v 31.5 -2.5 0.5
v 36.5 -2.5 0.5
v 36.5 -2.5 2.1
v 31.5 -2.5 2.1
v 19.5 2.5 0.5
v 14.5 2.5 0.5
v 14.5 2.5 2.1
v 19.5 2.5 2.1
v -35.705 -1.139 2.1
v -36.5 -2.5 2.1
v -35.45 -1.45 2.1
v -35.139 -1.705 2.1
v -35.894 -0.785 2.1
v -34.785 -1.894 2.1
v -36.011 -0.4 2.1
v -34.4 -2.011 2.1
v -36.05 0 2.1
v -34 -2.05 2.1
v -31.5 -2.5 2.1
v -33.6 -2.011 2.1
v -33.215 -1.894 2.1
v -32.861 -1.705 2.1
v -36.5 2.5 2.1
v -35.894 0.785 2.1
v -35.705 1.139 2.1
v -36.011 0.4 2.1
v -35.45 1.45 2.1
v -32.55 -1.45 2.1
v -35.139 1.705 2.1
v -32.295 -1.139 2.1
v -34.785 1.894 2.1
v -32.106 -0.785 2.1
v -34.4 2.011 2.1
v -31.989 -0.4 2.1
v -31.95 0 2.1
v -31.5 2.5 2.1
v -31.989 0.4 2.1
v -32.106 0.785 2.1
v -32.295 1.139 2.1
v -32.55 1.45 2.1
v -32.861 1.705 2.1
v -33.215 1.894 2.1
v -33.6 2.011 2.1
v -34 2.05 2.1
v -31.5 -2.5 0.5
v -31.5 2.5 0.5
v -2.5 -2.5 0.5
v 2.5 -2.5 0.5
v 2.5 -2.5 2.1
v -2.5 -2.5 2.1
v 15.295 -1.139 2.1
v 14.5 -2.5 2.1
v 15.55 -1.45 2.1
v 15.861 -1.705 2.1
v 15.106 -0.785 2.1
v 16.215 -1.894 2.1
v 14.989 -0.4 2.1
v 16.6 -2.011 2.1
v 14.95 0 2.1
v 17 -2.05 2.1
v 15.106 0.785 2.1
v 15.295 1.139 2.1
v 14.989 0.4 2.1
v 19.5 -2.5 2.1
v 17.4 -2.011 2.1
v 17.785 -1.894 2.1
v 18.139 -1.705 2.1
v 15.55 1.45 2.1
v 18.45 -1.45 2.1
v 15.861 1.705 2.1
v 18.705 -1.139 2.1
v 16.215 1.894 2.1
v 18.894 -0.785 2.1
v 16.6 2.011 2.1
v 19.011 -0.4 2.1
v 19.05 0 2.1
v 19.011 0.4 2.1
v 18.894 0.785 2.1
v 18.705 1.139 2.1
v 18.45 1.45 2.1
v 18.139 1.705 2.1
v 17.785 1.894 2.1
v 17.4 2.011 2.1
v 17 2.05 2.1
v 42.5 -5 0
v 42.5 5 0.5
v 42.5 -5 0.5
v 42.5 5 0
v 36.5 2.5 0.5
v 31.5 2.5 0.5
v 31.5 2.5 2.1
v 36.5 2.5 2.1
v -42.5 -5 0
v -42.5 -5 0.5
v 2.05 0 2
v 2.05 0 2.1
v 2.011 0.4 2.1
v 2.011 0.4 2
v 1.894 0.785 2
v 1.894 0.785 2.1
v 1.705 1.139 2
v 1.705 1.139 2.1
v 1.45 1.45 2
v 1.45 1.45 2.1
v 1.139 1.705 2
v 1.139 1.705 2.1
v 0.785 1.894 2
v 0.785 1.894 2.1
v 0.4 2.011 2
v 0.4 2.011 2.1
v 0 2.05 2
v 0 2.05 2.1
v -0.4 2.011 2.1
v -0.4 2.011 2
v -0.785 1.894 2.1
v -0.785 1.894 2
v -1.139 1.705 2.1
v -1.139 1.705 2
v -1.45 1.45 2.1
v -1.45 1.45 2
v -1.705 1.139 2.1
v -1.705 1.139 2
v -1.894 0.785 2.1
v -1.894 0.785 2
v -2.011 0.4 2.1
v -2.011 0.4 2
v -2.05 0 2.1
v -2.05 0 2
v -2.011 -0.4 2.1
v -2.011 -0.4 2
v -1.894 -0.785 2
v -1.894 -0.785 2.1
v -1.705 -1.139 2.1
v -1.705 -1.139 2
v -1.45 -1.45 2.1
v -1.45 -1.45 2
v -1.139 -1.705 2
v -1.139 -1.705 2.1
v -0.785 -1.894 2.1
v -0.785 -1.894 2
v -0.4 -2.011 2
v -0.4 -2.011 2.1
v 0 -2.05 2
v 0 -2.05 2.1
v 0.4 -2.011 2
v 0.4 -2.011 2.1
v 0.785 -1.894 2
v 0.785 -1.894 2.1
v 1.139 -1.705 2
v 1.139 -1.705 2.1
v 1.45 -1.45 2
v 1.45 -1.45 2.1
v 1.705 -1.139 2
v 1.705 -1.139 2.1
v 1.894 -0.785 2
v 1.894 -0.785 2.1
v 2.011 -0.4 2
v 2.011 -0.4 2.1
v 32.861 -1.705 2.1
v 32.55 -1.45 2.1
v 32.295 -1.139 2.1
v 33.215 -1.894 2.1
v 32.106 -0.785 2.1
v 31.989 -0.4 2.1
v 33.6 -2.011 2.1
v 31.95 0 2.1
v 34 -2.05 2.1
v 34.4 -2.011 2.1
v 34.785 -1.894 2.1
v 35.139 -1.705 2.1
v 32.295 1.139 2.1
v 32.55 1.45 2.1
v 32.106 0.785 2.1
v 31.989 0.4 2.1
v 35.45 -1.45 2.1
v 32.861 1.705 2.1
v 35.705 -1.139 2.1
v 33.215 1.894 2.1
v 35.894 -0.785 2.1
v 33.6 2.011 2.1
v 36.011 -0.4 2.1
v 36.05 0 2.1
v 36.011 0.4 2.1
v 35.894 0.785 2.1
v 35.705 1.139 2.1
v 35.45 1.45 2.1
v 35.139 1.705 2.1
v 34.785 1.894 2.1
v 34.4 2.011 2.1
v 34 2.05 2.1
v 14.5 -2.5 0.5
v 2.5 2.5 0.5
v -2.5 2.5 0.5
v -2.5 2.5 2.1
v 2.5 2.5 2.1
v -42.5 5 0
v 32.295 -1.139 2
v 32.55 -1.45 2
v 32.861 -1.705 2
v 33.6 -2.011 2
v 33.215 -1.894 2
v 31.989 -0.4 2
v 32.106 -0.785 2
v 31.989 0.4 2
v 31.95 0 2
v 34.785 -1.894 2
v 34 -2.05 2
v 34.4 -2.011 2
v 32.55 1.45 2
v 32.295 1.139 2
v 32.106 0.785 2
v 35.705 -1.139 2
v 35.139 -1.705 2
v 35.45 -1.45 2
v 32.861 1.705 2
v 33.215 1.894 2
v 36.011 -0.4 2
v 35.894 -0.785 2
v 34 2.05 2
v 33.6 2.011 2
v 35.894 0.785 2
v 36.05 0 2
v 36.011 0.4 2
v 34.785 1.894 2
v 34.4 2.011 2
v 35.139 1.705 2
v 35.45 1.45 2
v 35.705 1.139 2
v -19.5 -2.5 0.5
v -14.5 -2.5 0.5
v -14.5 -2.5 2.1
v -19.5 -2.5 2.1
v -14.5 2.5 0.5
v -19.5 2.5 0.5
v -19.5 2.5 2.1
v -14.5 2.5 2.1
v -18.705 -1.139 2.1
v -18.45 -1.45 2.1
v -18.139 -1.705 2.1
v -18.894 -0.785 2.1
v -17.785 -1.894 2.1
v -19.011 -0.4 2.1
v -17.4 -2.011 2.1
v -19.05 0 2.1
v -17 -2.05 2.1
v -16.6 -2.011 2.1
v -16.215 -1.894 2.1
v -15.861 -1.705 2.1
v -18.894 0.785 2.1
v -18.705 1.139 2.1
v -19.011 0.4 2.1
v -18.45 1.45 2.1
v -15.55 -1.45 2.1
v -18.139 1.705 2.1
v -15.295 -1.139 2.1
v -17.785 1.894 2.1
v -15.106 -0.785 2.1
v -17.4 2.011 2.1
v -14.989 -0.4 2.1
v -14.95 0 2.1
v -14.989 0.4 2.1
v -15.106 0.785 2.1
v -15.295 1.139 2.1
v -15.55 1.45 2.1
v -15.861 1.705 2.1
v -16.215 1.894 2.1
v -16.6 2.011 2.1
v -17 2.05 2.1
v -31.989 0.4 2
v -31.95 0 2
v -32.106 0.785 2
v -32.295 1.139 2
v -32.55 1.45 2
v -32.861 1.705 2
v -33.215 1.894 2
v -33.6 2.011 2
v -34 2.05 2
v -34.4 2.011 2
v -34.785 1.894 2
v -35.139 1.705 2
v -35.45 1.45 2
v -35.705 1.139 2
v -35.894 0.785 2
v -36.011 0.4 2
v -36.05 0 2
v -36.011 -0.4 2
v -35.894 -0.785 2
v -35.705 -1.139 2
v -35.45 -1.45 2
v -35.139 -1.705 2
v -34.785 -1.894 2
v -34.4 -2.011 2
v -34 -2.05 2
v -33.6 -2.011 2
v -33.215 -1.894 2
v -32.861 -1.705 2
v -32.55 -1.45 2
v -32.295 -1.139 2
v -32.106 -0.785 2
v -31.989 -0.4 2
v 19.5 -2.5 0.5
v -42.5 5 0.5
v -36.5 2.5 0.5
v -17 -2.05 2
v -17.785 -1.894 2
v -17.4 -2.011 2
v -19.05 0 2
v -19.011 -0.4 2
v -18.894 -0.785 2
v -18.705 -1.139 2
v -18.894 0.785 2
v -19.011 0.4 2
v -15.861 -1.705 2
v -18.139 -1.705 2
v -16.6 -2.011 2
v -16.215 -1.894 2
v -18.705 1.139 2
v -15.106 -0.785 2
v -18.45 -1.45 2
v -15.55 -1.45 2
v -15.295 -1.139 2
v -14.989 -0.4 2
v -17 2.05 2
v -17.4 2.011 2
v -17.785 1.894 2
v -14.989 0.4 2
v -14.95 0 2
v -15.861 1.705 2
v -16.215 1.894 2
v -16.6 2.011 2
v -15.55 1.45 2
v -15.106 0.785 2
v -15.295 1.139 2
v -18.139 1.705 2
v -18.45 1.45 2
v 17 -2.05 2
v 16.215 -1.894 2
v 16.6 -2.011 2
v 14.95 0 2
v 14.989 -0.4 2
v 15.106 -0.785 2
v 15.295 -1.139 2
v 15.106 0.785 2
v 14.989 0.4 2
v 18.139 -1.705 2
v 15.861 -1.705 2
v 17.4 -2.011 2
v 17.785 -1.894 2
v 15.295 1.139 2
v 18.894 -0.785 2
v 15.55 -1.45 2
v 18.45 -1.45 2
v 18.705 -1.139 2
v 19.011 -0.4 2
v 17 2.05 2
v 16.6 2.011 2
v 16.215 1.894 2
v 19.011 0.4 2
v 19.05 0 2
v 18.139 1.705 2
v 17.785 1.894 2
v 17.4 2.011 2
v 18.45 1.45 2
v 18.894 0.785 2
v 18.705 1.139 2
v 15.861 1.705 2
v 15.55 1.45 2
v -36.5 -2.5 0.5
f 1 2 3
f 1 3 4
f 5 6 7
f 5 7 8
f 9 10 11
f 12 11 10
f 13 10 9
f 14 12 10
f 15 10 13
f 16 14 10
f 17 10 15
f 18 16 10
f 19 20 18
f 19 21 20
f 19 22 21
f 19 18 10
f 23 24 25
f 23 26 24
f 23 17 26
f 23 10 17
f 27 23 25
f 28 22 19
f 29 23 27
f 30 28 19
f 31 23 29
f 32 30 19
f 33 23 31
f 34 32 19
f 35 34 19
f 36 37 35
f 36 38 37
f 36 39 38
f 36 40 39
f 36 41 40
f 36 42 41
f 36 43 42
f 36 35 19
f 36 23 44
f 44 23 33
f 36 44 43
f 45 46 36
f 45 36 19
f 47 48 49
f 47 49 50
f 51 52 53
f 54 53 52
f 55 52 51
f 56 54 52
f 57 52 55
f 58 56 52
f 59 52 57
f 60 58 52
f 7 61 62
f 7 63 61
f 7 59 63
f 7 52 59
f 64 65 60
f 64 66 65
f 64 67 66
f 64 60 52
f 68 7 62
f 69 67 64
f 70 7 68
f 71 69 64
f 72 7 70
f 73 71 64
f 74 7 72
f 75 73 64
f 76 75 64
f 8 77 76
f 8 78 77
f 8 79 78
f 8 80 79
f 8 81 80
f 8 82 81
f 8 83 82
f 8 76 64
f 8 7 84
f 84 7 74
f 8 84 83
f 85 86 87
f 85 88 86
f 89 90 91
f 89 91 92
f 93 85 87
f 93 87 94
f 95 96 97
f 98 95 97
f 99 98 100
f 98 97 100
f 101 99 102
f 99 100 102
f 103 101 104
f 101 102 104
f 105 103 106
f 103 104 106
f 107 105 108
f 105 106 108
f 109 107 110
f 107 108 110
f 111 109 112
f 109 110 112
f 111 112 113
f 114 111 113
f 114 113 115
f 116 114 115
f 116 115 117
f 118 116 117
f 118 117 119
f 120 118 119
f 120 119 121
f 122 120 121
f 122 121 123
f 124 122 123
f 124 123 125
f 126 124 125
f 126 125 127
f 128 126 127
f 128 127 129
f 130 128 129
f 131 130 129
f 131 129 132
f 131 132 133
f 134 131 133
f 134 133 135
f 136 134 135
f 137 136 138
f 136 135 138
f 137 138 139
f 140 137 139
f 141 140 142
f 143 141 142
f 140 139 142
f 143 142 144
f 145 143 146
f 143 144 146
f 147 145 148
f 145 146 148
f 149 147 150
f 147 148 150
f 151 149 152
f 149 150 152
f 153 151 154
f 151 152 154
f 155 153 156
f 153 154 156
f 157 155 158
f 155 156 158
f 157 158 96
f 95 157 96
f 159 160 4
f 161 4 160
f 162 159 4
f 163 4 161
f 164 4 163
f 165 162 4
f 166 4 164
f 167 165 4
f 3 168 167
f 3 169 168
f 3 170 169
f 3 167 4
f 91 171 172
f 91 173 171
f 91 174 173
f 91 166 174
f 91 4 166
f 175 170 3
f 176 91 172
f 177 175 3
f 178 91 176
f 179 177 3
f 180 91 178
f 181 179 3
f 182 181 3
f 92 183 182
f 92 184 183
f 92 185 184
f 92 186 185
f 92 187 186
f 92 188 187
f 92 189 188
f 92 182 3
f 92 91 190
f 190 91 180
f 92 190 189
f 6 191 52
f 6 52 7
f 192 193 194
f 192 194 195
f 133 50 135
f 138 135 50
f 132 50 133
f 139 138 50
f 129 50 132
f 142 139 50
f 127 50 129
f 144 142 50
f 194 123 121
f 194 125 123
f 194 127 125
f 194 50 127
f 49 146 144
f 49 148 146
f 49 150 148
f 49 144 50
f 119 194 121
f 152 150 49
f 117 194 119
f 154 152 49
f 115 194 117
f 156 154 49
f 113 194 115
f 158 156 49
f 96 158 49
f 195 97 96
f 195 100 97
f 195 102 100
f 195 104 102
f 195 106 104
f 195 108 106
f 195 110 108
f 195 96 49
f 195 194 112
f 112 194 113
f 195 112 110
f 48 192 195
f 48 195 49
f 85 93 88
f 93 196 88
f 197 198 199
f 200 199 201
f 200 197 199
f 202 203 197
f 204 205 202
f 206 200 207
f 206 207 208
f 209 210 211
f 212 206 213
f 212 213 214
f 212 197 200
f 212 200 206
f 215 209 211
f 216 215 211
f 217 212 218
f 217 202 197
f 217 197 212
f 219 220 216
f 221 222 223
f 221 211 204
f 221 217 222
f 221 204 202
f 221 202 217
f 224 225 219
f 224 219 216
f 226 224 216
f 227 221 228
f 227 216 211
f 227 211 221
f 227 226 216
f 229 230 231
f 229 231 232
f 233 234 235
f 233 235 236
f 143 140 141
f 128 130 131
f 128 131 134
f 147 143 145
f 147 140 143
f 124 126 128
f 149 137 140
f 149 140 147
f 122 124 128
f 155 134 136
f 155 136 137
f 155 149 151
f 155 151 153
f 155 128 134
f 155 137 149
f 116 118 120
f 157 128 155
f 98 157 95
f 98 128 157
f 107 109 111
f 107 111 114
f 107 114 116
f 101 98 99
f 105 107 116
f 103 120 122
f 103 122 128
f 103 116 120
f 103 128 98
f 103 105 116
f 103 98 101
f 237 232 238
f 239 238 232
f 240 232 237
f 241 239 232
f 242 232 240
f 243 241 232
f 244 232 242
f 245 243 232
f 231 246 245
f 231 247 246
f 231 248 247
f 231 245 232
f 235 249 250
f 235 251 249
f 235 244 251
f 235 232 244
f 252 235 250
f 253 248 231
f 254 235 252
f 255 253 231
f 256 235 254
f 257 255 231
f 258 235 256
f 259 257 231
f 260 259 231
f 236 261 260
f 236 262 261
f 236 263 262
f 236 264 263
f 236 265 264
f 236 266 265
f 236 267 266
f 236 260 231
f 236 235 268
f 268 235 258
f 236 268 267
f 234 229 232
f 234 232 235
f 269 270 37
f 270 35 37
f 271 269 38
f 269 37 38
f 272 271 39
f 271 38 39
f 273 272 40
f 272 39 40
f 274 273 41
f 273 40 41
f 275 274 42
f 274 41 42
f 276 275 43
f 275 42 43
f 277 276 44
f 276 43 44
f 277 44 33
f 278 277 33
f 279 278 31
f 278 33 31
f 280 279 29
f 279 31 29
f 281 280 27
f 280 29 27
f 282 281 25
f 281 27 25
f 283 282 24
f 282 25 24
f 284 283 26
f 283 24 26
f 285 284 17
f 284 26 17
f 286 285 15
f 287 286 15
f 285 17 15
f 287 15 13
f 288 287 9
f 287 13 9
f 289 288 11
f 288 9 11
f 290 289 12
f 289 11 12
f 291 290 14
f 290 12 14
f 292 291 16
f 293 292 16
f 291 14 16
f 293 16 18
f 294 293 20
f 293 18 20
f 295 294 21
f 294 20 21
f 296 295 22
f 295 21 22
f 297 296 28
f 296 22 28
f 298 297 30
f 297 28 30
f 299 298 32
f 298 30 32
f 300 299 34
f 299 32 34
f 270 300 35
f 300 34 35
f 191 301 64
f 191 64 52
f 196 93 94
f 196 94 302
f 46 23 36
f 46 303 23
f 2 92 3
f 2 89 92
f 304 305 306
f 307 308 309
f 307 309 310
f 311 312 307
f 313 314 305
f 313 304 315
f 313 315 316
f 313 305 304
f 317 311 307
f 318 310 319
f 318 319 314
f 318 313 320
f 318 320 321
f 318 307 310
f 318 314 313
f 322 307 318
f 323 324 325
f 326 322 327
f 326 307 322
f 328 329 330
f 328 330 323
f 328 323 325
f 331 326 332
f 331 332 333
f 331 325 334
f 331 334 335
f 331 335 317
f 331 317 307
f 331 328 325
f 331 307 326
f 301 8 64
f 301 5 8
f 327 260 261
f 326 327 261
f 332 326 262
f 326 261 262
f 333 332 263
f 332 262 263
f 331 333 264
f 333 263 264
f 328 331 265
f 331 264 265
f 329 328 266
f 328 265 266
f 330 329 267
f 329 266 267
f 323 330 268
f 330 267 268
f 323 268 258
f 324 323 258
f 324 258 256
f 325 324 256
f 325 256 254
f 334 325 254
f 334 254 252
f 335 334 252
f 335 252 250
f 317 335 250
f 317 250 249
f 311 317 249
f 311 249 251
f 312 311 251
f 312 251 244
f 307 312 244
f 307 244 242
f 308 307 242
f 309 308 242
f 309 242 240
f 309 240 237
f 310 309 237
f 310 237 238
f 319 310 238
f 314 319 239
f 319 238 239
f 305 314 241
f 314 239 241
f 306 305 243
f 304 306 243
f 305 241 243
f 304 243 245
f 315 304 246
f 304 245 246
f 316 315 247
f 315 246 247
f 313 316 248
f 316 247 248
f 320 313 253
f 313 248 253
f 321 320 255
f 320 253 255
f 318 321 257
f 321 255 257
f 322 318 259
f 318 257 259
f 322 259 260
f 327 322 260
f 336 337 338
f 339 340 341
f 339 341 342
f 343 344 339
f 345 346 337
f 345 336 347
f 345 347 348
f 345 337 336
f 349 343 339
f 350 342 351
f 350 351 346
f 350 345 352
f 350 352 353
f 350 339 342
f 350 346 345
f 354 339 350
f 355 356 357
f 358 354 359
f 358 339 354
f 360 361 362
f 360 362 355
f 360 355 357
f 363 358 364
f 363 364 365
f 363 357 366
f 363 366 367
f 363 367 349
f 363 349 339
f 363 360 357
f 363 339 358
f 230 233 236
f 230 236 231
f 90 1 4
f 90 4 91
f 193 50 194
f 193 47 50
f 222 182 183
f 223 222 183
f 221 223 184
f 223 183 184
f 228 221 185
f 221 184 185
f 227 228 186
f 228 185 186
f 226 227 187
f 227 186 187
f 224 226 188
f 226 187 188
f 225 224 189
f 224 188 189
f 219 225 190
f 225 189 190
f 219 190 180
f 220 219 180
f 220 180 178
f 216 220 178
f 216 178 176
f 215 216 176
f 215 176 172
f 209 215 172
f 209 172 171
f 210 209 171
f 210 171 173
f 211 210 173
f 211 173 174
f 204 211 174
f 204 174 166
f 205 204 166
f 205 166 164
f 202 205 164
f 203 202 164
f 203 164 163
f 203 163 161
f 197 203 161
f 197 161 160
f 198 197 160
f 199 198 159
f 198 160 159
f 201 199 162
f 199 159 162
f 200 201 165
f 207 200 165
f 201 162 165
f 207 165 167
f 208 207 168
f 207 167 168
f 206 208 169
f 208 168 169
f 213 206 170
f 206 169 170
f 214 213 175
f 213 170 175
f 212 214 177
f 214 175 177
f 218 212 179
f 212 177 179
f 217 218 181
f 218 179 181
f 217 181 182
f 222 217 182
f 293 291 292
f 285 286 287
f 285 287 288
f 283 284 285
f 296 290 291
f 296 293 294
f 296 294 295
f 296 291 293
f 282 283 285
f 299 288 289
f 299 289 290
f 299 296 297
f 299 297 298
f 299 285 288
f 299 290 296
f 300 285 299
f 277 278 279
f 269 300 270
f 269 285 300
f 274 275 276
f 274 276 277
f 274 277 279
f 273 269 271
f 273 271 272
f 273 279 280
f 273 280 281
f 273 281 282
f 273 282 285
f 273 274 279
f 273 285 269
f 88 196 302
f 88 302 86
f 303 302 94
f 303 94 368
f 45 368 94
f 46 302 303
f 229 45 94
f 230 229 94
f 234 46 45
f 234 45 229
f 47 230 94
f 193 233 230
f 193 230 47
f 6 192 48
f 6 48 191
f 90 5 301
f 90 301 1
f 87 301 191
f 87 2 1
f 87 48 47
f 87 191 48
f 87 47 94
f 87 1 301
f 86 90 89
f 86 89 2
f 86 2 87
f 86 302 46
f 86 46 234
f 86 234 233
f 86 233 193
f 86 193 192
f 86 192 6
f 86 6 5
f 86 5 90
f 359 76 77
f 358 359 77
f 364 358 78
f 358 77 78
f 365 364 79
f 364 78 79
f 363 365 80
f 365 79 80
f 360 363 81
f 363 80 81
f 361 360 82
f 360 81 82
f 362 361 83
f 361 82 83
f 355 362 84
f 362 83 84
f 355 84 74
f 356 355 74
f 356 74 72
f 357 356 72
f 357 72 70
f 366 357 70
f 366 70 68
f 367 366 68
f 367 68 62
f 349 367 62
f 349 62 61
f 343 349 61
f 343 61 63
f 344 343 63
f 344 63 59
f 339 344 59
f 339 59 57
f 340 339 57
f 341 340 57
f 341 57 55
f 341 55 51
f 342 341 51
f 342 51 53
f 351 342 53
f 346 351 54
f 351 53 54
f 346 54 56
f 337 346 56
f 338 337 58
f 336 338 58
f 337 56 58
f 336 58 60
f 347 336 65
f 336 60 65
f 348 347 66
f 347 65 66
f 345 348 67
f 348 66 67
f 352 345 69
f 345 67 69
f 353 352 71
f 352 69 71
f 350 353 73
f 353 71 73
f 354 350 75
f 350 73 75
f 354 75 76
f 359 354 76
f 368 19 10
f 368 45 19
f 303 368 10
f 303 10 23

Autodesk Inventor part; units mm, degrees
ref_plane "YZ Plane" through (0, 0, 0) normal (1, 0, 0) x (0, 1, 0)
ref_plane "XZ Plane" through (0, 0, 0) normal (0, 1, 0) x (-1, 0, 0)
ref_plane "XY Plane" through (0, 0, 0) normal (0, 0, 1) x (1, 0, 0)
sketch "Sketch1" plane through (0, 0, 0) normal (0, 0, 1) x (1, 0, 0)
  line L0 (-42.5, 5) -> (42.5, 5)
  line L1 (42.5, 5) -> (42.5, -5)
  line L2 (42.5, -5) -> (-42.5, -5)
  line L3 (-42.5, -5) -> (-42.5, 5)
  line L4 (-42.5, 5) -> (42.5, -5) construction
  line L5 (42.5, 5) -> (-42.5, -5) construction
  point P0 (0, 0)
  dimension "d0" = 85
  dimension "d1" = 10
extrude "Extrusion1" add sketch "Sketch1" along normal blind 0.5
sketch "Sketch2" plane through (0, 0, 0.5) normal (0, 0, 1) x (1, 0, 0)
  line L0 (-36.5, 2.5) -> (-31.5, 2.5)
  line L1 (-31.5, 2.5) -> (-31.5, -2.5)
  line L2 (-31.5, -2.5) -> (-36.5, -2.5)
  line L3 (-36.5, -2.5) -> (-36.5, 2.5)
  line L4 (-36.5, 2.5) -> (-31.5, -2.5) construction
  line L5 (-31.5, 2.5) -> (-36.5, -2.5) construction
  line L6 (-42.5, 5) -> (-42.5, -5) projected
  point P0 (0, 0)
  point P1 (-34, 0)
  point P2 (-34, 0)
  point P3 (-42.5, 0)
  dimension "d4" = 5
  dimension "d5" = 5
  dimension "d6" = 6
extrude "Extrusion2" add sketch "Sketch2" along normal blind 1.6
sketch "Sketch3" plane through (0, 0, 2.1) normal (0, 0, 1) x (1, 0, 0)
  line L0 (-31.5, 2.5) -> (-36.5, 2.5) projected
  line L1 (-36.5, 2.5) -> (-36.5, -2.5) projected
  line L2 (-36.5, -2.5) -> (-31.5, -2.5) projected
  line L3 (-31.5, -2.5) -> (-31.5, 2.5) projected
  circle A0 centre (-34, 0) radius 2.05
  point P0 (0, 0)
  point P1 (-31.5, 0)
  point P2 (-34, 2.5)
  dimension "d9" = 4.1
extrude "Extrusion3" cut sketch "Sketch3" against normal blind 0.1 contours A0
pattern_linear "Rectangular Pattern1" count 5 spacing 17 along (1, 0, 0) of "Extrusion3", "Extrusion2"
properties part number "LED Strip 5050 x 5"
